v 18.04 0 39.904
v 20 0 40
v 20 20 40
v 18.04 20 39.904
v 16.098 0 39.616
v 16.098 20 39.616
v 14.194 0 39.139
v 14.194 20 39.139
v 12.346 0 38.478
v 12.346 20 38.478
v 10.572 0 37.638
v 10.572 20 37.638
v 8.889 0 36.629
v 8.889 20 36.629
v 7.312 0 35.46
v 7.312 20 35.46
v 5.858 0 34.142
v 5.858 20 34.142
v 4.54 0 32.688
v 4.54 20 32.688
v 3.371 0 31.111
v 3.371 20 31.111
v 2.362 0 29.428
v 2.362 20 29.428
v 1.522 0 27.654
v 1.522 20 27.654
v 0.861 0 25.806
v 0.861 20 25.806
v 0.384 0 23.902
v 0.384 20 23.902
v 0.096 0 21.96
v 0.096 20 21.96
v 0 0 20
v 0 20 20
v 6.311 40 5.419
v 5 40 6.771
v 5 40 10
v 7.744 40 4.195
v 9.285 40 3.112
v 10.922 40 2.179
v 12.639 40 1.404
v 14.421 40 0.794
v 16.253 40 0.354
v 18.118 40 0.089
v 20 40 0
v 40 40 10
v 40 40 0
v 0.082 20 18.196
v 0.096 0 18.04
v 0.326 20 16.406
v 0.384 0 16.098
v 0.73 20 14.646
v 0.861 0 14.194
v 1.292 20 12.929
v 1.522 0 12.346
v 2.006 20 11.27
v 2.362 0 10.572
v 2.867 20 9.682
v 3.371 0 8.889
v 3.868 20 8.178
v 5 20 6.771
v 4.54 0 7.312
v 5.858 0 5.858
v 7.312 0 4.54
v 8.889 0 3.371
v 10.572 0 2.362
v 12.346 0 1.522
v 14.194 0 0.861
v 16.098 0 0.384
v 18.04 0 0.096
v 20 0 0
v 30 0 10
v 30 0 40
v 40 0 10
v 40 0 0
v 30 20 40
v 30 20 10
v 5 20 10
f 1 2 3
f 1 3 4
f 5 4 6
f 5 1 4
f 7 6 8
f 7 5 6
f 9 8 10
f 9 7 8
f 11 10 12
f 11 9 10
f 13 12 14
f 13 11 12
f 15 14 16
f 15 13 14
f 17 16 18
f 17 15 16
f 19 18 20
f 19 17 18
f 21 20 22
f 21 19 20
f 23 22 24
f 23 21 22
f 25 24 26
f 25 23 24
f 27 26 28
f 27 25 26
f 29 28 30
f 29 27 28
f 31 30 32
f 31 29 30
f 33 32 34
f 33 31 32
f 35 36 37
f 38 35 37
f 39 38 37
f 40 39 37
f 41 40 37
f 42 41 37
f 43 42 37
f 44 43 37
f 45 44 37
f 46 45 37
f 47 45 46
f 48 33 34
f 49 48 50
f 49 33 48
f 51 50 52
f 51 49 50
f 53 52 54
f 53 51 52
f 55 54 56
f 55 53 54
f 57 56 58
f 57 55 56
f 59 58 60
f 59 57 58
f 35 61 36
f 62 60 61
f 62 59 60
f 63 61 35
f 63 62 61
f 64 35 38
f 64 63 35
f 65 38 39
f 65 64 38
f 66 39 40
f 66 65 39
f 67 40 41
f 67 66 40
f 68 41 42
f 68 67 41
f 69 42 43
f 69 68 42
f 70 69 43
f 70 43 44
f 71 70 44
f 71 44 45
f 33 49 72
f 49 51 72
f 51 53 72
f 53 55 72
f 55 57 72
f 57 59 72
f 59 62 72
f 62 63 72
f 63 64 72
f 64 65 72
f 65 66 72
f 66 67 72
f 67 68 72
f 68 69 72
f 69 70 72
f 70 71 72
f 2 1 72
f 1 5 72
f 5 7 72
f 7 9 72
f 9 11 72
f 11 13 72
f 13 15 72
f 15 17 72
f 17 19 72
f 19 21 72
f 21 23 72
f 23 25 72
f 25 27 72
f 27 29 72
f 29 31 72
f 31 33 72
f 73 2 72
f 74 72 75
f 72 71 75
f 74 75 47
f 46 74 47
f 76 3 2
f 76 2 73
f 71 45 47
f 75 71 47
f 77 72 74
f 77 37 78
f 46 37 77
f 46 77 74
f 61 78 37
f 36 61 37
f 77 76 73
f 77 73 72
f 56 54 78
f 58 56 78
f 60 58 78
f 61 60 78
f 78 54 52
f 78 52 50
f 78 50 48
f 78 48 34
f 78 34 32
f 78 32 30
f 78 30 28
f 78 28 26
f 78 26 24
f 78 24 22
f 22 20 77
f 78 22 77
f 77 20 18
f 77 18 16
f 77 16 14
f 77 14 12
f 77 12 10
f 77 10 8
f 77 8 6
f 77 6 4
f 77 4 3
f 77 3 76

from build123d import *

# Parameters (mm, degrees)
SKETCH1_W           = 40
SKETCH1_H           = 40
BOSS_EXTRUDE1_DEPTH = 40
SKETCH2_W           = 5
SKETCH2_H           = 20
CUT_EXTRUDE1_DEPTH  = 40
CUT_EXTRUDE2_DEPTH  = 40
SKETCH4_W           = 10
SKETCH4_H           = 30
CUT_EXTRUDE3_DEPTH  = 40
SKETCH5_W           = 30
SKETCH5_H           = 20
CUT_EXTRUDE4_DEPTH  = 40


with BuildPart() as part:
    # Sketch1 → Boss-Extrude1 (new body)
    with BuildSketch(Plane.XY):
        with Locations((20, 20)):
            Rectangle(SKETCH1_W, SKETCH1_H)
    extrude(amount=BOSS_EXTRUDE1_DEPTH)

    # Sketch2 → Cut-Extrude1 (cut)
    with BuildSketch(Plane.XY.offset(40)):
        with Locations((2.5, 30)):
            Rectangle(SKETCH2_W, SKETCH2_H)
    extrude(amount=-CUT_EXTRUDE1_DEPTH, mode=Mode.SUBTRACT)

    # Sketch3 → Cut-Extrude2 (cut)
    with BuildSketch(Plane(origin=(0, 0, 0), x_dir=(1, 0, 0), z_dir=(0, 1, 0))):
        with BuildLine():
            ThreePointArc((0, -20.000000105), (5.857864339, -5.857864414), (20, 0))
            Line((20, 0), (0, 0))
            Line((0, 0), (0, -20.000000105))
        make_face()
        with BuildLine():
            ThreePointArc((20, -40), (5.857864414, -34.142135661), (0, -20.000000105))
            Line((0, -20.000000105), (0, -40))
            Line((0, -40), (20, -40))
        make_face()
    extrude(amount=CUT_EXTRUDE2_DEPTH, mode=Mode.SUBTRACT)

    # Sketch4 → Cut-Extrude3 (cut)
    with BuildSketch(Plane(origin=(0, 40, 0), x_dir=(1, 0, 0), z_dir=(0, 1, 0))):
        with Locations((35, -25)):
            Rectangle(SKETCH4_W, SKETCH4_H)
    extrude(amount=-CUT_EXTRUDE3_DEPTH, mode=Mode.SUBTRACT)

    # Sketch5 → Cut-Extrude4 (cut)
    with BuildSketch(Plane(origin=(30, 0, 0), x_dir=(0, 0, -1), z_dir=(1, 0, 0))):
        with Locations((-25, 30)):
            Rectangle(SKETCH5_W, SKETCH5_H)
    extrude(amount=-CUT_EXTRUDE4_DEPTH, mode=Mode.SUBTRACT)


solid = part.part
